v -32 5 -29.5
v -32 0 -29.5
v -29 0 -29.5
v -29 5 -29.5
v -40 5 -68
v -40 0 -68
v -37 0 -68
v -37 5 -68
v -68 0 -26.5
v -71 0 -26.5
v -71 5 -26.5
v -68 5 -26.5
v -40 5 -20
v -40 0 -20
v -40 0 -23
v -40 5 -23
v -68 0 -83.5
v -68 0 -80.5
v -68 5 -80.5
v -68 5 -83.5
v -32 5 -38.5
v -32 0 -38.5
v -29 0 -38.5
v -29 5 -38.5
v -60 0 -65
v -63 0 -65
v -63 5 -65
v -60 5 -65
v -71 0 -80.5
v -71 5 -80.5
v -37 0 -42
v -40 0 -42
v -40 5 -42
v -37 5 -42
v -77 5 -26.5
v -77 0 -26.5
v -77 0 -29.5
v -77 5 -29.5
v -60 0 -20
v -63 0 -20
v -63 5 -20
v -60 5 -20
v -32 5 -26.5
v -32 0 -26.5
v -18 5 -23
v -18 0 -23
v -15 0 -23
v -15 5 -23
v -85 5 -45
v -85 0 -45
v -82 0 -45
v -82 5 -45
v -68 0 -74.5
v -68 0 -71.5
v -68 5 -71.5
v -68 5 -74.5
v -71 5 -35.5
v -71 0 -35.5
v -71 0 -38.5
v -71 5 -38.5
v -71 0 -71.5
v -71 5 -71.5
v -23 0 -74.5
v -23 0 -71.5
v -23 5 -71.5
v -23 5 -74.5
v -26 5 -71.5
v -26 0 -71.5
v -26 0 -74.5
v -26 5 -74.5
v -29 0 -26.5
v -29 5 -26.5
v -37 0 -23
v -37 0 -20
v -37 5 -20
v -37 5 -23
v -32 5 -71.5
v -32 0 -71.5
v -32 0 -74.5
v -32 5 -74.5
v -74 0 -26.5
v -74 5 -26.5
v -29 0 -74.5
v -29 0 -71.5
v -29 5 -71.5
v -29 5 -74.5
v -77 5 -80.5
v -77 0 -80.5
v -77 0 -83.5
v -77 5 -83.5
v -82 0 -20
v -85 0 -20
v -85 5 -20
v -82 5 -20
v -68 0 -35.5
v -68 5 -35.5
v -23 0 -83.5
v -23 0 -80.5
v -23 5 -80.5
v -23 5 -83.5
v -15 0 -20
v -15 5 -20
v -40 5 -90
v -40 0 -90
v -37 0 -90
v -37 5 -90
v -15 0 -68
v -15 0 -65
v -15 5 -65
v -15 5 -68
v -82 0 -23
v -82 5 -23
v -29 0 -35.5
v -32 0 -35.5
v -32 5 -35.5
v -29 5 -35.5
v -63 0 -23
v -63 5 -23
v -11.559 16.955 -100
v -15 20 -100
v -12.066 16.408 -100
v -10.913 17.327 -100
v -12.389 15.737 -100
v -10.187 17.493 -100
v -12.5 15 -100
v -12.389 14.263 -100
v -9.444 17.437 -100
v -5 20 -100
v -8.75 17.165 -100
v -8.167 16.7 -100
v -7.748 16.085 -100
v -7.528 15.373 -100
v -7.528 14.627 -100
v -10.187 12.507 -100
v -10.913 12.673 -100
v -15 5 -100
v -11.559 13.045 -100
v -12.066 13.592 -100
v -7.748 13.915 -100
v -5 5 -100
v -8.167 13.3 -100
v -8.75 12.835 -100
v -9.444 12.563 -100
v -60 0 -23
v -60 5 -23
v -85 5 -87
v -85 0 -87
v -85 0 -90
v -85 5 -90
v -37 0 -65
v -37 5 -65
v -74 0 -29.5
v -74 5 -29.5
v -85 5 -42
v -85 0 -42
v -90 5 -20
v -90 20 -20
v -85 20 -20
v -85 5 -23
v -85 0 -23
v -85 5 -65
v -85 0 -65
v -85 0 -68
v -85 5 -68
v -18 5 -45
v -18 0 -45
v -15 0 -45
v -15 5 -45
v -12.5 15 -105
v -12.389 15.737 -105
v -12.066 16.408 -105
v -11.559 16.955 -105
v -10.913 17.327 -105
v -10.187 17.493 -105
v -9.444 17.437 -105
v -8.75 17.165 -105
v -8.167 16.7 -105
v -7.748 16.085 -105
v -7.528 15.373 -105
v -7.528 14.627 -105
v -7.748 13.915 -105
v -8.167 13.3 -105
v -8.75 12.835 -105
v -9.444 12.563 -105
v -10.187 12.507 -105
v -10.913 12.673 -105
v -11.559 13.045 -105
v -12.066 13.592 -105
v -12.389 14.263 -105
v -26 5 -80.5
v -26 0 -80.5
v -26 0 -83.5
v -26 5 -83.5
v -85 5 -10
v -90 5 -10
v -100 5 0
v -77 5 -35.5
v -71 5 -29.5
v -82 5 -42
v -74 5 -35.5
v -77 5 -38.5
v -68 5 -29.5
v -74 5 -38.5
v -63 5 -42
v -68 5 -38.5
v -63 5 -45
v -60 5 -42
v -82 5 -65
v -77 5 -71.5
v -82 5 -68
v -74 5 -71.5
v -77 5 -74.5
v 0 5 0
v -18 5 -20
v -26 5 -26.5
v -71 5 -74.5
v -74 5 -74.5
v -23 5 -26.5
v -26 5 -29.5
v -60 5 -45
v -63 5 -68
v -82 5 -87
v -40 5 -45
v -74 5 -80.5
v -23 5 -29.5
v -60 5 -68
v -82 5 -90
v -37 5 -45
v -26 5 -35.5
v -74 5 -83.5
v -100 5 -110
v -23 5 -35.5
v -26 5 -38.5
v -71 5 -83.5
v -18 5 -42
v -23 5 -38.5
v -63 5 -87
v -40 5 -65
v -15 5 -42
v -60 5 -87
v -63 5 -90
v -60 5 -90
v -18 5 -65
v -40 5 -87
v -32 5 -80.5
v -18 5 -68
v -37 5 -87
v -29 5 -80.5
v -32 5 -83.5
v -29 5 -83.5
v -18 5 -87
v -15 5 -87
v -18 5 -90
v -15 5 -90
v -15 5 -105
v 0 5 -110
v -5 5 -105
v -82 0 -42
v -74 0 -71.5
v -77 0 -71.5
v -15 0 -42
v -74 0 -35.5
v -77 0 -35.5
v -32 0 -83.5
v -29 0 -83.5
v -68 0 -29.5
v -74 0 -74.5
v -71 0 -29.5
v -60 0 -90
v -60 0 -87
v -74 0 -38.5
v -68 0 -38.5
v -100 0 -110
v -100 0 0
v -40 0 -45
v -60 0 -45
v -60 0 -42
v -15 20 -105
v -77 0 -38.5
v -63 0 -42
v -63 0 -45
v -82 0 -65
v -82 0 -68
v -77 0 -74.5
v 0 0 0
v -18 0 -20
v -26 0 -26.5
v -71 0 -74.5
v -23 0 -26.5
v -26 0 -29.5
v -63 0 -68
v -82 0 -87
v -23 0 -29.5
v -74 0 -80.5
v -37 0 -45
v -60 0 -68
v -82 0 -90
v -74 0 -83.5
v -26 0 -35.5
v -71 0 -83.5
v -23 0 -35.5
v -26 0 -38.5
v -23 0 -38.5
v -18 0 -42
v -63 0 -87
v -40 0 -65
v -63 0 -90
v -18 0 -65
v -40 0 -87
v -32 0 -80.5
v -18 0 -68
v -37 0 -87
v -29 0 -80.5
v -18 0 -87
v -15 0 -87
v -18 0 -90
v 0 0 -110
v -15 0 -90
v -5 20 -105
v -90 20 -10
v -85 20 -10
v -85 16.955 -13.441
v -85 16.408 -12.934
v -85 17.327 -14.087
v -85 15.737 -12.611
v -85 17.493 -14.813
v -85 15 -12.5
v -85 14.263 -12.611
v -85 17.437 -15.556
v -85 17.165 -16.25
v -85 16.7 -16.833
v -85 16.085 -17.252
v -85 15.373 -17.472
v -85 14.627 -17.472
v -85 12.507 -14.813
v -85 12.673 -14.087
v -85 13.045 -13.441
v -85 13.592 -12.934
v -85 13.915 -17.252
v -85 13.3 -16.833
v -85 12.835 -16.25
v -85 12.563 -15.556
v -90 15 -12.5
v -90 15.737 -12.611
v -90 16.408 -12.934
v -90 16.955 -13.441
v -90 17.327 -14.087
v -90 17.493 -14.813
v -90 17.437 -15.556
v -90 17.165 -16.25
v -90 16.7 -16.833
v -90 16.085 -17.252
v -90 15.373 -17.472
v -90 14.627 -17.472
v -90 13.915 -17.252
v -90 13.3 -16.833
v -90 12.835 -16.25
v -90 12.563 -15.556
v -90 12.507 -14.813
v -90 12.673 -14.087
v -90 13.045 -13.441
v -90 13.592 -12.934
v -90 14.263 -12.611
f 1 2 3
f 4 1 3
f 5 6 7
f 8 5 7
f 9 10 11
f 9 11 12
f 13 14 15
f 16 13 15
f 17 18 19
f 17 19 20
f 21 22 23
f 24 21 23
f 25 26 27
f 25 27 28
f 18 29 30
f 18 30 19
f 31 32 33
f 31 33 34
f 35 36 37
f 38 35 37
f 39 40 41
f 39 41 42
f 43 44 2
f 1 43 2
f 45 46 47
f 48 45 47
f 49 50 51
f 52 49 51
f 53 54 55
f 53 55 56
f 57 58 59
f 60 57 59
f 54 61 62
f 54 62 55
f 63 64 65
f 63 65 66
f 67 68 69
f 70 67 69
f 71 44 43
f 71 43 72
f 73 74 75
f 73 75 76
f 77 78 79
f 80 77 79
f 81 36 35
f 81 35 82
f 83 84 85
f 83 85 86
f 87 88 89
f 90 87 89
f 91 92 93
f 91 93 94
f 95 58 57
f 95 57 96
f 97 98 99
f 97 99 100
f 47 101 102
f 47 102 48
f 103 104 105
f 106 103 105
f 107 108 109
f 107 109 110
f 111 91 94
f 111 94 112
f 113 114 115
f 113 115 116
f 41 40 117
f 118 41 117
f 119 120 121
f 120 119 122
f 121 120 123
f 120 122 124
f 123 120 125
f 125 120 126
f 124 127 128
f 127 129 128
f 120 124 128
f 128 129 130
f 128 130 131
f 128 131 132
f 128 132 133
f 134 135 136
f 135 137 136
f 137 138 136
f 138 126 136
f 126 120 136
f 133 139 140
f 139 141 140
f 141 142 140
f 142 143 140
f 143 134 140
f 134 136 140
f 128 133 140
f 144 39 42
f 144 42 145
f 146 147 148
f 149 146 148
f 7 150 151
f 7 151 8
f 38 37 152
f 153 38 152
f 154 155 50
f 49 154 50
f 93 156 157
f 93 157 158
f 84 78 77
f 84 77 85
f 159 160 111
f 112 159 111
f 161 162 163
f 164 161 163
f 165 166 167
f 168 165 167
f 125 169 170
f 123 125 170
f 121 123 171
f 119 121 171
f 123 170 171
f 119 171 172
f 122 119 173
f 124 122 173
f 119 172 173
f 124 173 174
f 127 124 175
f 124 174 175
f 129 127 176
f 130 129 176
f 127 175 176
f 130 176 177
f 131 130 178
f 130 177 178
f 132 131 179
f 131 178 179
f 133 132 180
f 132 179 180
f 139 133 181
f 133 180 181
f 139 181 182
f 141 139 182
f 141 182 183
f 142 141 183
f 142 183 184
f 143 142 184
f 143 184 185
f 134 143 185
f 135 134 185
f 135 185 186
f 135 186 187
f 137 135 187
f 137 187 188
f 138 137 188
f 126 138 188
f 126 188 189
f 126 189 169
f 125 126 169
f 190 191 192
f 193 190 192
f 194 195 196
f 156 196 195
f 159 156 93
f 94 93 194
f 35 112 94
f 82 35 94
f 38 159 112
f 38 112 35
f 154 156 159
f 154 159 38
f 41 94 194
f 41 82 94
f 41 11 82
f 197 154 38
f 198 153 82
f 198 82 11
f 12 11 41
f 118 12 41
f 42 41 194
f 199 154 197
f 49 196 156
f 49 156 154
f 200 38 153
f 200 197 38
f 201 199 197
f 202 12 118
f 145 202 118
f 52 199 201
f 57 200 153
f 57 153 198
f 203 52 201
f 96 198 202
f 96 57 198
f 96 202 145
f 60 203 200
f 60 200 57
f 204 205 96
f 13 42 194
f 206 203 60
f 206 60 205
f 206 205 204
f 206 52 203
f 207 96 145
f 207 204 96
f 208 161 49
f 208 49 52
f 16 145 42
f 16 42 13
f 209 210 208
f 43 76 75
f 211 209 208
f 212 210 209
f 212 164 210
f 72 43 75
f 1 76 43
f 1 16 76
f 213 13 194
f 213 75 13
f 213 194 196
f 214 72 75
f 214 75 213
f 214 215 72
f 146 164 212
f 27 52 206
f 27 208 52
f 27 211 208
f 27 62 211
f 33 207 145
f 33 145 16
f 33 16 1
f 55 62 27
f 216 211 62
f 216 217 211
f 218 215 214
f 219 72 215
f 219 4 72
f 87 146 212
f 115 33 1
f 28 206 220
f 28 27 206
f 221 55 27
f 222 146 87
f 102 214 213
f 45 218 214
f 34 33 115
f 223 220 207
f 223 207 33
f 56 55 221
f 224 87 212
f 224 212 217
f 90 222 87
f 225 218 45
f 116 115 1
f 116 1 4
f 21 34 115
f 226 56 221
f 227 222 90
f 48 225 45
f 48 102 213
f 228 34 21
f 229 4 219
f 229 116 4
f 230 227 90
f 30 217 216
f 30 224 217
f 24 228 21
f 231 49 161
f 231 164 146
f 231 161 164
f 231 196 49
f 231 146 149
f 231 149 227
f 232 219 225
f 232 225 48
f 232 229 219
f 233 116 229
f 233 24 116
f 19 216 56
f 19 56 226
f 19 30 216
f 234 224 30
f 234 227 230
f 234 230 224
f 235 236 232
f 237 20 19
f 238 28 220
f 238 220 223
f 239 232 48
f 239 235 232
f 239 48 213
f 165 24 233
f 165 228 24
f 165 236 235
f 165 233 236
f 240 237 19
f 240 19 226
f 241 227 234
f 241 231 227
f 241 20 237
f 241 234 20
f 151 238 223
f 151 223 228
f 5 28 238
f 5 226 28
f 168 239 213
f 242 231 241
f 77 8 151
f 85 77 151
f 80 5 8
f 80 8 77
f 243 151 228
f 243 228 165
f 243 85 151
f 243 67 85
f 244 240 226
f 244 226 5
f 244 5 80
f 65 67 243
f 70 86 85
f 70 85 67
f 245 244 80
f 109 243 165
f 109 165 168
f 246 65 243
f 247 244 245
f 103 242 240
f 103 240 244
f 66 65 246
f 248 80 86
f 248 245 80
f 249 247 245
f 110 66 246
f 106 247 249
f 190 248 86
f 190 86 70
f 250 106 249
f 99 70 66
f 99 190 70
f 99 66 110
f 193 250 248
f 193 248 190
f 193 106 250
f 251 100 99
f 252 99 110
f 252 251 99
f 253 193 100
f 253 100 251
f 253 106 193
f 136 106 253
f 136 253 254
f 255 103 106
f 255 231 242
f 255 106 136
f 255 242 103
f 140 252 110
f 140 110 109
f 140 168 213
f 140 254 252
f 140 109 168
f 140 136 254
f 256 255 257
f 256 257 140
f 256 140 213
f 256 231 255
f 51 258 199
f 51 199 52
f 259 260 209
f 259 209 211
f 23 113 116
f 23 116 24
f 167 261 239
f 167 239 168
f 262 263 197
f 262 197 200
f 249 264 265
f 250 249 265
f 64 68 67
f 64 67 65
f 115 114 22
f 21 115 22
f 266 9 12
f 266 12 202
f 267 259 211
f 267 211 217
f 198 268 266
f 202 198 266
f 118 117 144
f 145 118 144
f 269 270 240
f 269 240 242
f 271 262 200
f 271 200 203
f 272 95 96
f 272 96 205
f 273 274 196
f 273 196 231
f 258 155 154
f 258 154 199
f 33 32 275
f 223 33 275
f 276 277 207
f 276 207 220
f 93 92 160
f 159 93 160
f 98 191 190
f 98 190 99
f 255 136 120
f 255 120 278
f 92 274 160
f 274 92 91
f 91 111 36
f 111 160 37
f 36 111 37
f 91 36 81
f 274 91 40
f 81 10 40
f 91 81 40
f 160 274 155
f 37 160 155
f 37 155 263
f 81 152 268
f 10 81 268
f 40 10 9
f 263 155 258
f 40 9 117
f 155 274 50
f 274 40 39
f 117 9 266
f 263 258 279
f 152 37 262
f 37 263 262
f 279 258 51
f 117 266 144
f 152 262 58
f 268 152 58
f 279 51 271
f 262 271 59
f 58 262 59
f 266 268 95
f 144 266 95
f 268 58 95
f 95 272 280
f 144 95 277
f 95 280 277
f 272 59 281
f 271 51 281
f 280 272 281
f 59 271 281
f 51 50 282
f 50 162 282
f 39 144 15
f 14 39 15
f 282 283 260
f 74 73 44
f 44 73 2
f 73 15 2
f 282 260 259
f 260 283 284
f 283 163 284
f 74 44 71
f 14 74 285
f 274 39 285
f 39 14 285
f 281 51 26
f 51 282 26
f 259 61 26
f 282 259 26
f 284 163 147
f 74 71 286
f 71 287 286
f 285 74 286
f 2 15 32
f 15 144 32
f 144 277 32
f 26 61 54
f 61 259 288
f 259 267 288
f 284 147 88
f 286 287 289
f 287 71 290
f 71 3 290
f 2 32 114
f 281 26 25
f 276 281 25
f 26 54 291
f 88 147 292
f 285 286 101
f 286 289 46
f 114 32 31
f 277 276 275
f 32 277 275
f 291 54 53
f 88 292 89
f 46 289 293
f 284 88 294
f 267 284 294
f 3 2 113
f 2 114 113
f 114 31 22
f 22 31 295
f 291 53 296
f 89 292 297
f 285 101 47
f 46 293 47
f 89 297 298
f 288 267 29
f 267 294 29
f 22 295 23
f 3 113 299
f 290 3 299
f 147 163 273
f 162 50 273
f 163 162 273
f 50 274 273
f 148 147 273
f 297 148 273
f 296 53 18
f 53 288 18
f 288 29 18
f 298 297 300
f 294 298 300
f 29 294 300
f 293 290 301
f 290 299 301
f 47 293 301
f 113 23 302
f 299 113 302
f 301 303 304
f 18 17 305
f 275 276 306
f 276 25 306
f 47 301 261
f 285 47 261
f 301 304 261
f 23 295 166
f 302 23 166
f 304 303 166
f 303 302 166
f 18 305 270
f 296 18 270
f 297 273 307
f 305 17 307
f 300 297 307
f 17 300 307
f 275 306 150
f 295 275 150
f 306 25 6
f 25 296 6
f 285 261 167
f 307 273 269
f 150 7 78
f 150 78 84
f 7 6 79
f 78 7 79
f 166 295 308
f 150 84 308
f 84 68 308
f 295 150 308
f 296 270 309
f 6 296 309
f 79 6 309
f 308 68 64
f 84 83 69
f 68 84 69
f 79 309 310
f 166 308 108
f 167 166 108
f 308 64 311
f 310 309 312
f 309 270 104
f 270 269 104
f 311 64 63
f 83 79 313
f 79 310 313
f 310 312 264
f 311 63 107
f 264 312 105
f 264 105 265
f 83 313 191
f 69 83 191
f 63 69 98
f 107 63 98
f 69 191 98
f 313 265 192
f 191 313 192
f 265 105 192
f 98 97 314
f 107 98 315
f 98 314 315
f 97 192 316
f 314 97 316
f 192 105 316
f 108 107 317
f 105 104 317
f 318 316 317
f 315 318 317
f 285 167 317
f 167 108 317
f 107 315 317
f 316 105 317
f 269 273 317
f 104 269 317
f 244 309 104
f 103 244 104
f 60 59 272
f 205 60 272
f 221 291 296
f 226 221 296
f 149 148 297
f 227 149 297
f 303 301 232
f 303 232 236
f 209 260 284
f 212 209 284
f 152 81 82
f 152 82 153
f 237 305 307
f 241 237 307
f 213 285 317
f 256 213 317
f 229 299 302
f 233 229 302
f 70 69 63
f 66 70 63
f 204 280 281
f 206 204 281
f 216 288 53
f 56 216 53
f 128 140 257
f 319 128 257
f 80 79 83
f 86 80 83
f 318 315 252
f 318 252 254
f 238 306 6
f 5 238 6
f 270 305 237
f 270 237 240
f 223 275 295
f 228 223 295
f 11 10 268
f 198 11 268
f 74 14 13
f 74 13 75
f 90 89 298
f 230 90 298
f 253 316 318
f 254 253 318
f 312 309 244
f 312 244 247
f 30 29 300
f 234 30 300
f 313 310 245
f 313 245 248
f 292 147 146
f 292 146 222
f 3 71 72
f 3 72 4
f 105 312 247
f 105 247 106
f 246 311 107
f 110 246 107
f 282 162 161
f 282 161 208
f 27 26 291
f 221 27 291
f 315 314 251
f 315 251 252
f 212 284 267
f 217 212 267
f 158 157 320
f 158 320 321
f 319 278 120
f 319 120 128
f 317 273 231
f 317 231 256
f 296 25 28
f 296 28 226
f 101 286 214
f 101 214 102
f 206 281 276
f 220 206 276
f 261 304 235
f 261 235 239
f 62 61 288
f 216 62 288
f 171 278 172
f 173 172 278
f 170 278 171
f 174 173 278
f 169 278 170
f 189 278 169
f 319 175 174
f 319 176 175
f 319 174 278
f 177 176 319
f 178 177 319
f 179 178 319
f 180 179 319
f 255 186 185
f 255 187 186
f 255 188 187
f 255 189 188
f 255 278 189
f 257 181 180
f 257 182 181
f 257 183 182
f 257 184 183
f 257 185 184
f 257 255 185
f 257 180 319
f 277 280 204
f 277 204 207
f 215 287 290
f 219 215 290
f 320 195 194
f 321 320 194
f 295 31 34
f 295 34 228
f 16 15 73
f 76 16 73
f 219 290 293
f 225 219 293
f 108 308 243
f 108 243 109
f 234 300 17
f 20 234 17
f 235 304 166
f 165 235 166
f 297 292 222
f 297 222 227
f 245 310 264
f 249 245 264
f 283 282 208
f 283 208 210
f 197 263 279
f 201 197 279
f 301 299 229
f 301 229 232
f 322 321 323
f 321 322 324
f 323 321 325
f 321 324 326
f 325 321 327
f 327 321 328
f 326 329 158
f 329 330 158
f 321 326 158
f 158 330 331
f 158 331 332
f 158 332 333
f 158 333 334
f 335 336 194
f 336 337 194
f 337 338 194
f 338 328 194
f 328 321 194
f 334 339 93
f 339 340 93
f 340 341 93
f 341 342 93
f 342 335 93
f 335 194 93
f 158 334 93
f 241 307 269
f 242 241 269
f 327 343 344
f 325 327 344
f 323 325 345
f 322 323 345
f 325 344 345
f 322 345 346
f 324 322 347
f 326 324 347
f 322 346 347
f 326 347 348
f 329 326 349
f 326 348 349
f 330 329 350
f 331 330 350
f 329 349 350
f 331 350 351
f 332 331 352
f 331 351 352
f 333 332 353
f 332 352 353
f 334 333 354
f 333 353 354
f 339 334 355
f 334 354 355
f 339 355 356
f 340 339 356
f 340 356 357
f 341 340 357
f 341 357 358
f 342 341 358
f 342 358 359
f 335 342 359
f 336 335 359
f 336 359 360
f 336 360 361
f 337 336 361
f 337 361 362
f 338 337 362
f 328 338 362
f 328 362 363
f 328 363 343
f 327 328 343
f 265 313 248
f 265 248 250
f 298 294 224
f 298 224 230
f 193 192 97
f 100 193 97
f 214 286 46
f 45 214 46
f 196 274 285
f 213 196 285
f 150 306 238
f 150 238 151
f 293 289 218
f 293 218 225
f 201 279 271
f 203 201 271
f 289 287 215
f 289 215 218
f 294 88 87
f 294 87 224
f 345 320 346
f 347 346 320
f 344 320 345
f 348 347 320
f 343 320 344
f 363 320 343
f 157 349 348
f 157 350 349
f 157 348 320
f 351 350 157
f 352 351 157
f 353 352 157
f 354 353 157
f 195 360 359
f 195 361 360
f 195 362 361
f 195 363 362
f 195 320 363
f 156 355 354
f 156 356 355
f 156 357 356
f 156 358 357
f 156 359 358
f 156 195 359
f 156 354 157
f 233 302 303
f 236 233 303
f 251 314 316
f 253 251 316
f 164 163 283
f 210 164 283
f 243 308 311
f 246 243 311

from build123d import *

# Parameters (mm, degrees)
SKETCH1_W           = 100
SKETCH1_H           = 110
SKETCH1_W_2         = 3
SKETCH1_H_2         = 3
BOSS_EXTRUDE1_DEPTH = 5
SKETCH2_W           = 10
SKETCH2_H           = 5
SKETCH2_W_2         = 5
SKETCH2_H_2         = 10
BOSS_EXTRUDE2_DEPTH = 15
SKETCH3_R           = 2.5
CUT_EXTRUDE1_DEPTH  = 15
SKETCH5_R           = 2.5
CUT_EXTRUDE2_DEPTH  = 15


with BuildPart() as part:
    # Sketch1 → Boss-Extrude1 (new body)
    with BuildSketch(Plane(origin=(0, 0, 0), x_dir=(1, 0, 0), z_dir=(0, 1, 0))):
        with Locations((-50, 55)):
            Rectangle(SKETCH1_W, SKETCH1_H)
        with Locations((-38.5, 43.5)):
            Rectangle(SKETCH1_W_2, SKETCH1_H_2, mode=Mode.SUBTRACT)
        with Locations((-16.5, 43.5)):
            Rectangle(SKETCH1_W_2, SKETCH1_H_2, mode=Mode.SUBTRACT)
        with Locations((-38.5, 21.5)):
            Rectangle(SKETCH1_W_2, SKETCH1_H_2, mode=Mode.SUBTRACT)
        with Locations((-16.5, 21.5)):
            Rectangle(SKETCH1_W_2, SKETCH1_H_2, mode=Mode.SUBTRACT)
        with Locations((-30.5, 37)):
            Rectangle(SKETCH1_W_2, SKETCH1_H_2, mode=Mode.SUBTRACT)
        with Locations((-30.5, 28)):
            Rectangle(SKETCH1_W_2, SKETCH1_H_2, mode=Mode.SUBTRACT)
        with Locations((-24.5, 37)):
            Rectangle(SKETCH1_W_2, SKETCH1_H_2, mode=Mode.SUBTRACT)
        with Locations((-24.5, 28)):
            Rectangle(SKETCH1_W_2, SKETCH1_H_2, mode=Mode.SUBTRACT)
        with Locations((-75.5, 28)):
            Rectangle(SKETCH1_W_2, SKETCH1_H_2, mode=Mode.SUBTRACT)
        with Locations((-75.5, 37)):
            Rectangle(SKETCH1_W_2, SKETCH1_H_2, mode=Mode.SUBTRACT)
        with Locations((-69.5, 28)):
            Rectangle(SKETCH1_W_2, SKETCH1_H_2, mode=Mode.SUBTRACT)
        with Locations((-69.5, 37)):
            Rectangle(SKETCH1_W_2, SKETCH1_H_2, mode=Mode.SUBTRACT)
        with Locations((-83.5, 21.5)):
            Rectangle(SKETCH1_W_2, SKETCH1_H_2, mode=Mode.SUBTRACT)
        with Locations((-61.5, 21.5)):
            Rectangle(SKETCH1_W_2, SKETCH1_H_2, mode=Mode.SUBTRACT)
        with Locations((-83.5, 43.5)):
            Rectangle(SKETCH1_W_2, SKETCH1_H_2, mode=Mode.SUBTRACT)
        with Locations((-61.5, 43.5)):
            Rectangle(SKETCH1_W_2, SKETCH1_H_2, mode=Mode.SUBTRACT)
        with Locations((-61.5, 66.5)):
            Rectangle(SKETCH1_W_2, SKETCH1_H_2, mode=Mode.SUBTRACT)
        with Locations((-83.5, 66.5)):
            Rectangle(SKETCH1_W_2, SKETCH1_H_2, mode=Mode.SUBTRACT)
        with Locations((-61.5, 88.5)):
            Rectangle(SKETCH1_W_2, SKETCH1_H_2, mode=Mode.SUBTRACT)
        with Locations((-83.5, 88.5)):
            Rectangle(SKETCH1_W_2, SKETCH1_H_2, mode=Mode.SUBTRACT)
        with Locations((-69.5, 73)):
            Rectangle(SKETCH1_W_2, SKETCH1_H_2, mode=Mode.SUBTRACT)
        with Locations((-69.5, 82)):
            Rectangle(SKETCH1_W_2, SKETCH1_H_2, mode=Mode.SUBTRACT)
        with Locations((-75.5, 73)):
            Rectangle(SKETCH1_W_2, SKETCH1_H_2, mode=Mode.SUBTRACT)
        with Locations((-75.5, 82)):
            Rectangle(SKETCH1_W_2, SKETCH1_H_2, mode=Mode.SUBTRACT)
        with Locations((-24.5, 82)):
            Rectangle(SKETCH1_W_2, SKETCH1_H_2, mode=Mode.SUBTRACT)
        with Locations((-24.5, 73)):
            Rectangle(SKETCH1_W_2, SKETCH1_H_2, mode=Mode.SUBTRACT)
        with Locations((-30.5, 82)):
            Rectangle(SKETCH1_W_2, SKETCH1_H_2, mode=Mode.SUBTRACT)
        with Locations((-30.5, 73)):
            Rectangle(SKETCH1_W_2, SKETCH1_H_2, mode=Mode.SUBTRACT)
        with Locations((-16.5, 88.5)):
            Rectangle(SKETCH1_W_2, SKETCH1_H_2, mode=Mode.SUBTRACT)
        with Locations((-38.5, 88.5)):
            Rectangle(SKETCH1_W_2, SKETCH1_H_2, mode=Mode.SUBTRACT)
        with Locations((-16.5, 66.5)):
            Rectangle(SKETCH1_W_2, SKETCH1_H_2, mode=Mode.SUBTRACT)
        with Locations((-38.5, 66.5)):
            Rectangle(SKETCH1_W_2, SKETCH1_H_2, mode=Mode.SUBTRACT)
    extrude(amount=BOSS_EXTRUDE1_DEPTH)

    # Sketch2 → Boss-Extrude2 (add)
    with BuildSketch(Plane(origin=(0, 5, 0), x_dir=(1, 0, 0), z_dir=(0, 1, 0))):
        with Locations((-10, 102.5)):
            Rectangle(SKETCH2_W, SKETCH2_H)
        with Locations((-87.5, 15)):
            Rectangle(SKETCH2_W_2, SKETCH2_H_2)
    extrude(amount=BOSS_EXTRUDE2_DEPTH)

    # Sketch3 → Cut-Extrude1 (cut)
    with BuildSketch(Plane(origin=(0, 0, -105), x_dir=(-1, 0, 0), z_dir=(0, 0, -1))):
        with Locations((10, 15)):
            Circle(SKETCH3_R)
    extrude(amount=-CUT_EXTRUDE1_DEPTH, mode=Mode.SUBTRACT)

    # Sketch5 → Cut-Extrude2 (cut)
    with BuildSketch(Plane.ZY.offset(90)):
        with Locations((-15, 15)):
            Circle(SKETCH5_R)
    extrude(amount=-CUT_EXTRUDE2_DEPTH, mode=Mode.SUBTRACT)


solid = part.part
